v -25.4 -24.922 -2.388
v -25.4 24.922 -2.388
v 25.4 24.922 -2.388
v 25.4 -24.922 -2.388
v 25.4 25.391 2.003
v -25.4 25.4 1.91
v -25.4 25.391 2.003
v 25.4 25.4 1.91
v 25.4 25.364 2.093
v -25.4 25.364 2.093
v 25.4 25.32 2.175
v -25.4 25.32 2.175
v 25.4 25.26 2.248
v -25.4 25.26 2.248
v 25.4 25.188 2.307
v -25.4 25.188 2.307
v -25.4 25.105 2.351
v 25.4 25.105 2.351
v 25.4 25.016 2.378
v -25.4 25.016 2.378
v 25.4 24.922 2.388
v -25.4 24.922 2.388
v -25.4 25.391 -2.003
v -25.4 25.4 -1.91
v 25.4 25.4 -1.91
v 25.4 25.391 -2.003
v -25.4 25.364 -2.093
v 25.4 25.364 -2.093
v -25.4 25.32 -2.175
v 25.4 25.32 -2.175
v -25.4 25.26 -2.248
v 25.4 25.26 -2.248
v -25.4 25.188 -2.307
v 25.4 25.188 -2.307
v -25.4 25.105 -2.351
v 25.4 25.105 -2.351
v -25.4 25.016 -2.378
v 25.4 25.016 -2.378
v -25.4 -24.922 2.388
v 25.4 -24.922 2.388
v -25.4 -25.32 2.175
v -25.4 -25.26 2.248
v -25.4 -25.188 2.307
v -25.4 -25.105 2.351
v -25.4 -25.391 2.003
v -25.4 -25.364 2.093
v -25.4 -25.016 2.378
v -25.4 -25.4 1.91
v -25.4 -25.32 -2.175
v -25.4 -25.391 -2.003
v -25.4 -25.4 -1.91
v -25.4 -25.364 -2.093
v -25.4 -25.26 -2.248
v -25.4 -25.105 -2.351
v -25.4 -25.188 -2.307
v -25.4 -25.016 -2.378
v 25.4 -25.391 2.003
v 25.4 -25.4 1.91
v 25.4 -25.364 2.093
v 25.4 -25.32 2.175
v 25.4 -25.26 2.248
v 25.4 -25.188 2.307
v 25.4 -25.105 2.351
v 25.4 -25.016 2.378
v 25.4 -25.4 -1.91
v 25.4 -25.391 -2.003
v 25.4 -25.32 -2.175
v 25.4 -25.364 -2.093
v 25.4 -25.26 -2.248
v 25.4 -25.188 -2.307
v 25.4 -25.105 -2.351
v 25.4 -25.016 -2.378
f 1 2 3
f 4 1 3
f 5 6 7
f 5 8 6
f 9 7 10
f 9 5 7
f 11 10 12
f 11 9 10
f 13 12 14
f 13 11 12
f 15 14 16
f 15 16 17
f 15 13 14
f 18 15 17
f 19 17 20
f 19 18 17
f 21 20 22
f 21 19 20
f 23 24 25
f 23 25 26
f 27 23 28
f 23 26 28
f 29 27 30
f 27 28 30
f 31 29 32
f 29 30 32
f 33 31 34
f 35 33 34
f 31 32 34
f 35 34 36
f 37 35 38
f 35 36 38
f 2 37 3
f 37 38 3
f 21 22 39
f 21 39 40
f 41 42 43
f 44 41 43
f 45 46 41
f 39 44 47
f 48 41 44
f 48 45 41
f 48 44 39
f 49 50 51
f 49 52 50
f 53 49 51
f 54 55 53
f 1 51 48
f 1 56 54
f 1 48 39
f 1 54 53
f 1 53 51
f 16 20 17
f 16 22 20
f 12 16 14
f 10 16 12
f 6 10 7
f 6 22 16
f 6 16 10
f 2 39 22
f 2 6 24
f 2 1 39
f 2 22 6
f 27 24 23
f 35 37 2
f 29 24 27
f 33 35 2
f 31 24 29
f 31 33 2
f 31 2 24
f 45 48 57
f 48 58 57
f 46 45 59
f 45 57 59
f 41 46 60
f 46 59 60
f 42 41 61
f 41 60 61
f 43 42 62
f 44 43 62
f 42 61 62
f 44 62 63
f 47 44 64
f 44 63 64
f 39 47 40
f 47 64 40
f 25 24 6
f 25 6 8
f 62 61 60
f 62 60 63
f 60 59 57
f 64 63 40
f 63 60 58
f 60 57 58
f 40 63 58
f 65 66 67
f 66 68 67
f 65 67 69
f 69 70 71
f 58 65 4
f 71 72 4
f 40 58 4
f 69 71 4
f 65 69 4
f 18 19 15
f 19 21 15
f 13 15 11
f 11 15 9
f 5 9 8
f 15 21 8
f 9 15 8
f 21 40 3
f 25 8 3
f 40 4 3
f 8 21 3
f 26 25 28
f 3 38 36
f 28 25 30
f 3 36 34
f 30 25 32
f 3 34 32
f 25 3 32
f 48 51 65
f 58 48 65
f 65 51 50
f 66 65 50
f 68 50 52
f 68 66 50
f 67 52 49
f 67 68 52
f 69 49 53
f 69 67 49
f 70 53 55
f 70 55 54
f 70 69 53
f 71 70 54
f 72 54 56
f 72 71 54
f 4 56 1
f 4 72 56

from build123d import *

# Parameters (mm, degrees)
BOSS_EXTRUDE1_DEPTH      = 2.3876
BOSS_EXTRUDE1_DEPTH_BACK = 2.3876
SKETCH3_W                = 50.8
SKETCH3_H                = 50.8
FILLET1_R                = 0.47752


with BuildPart() as part:
    # Sketch3 → Boss-Extrude1 (new, two sides: drawn at the far end of the back side and taken through both)
    with BuildSketch(Plane.XY.offset(-BOSS_EXTRUDE1_DEPTH_BACK)):
        Rectangle(SKETCH3_W, SKETCH3_H)
    extrude(amount=BOSS_EXTRUDE1_DEPTH + BOSS_EXTRUDE1_DEPTH_BACK)

    # Fillet1
    fillet1_edges = [part.edges().sort_by_distance(p)[0] for p in [
        (0, -25.4, 2.3876),
        (0, 25.4, -2.3876),
        (0, 25.4, 2.3876),
        (0, -25.4, -2.3876),
    ]]
    fillet(fillet1_edges, radius=FILLET1_R)


solid = part.part
